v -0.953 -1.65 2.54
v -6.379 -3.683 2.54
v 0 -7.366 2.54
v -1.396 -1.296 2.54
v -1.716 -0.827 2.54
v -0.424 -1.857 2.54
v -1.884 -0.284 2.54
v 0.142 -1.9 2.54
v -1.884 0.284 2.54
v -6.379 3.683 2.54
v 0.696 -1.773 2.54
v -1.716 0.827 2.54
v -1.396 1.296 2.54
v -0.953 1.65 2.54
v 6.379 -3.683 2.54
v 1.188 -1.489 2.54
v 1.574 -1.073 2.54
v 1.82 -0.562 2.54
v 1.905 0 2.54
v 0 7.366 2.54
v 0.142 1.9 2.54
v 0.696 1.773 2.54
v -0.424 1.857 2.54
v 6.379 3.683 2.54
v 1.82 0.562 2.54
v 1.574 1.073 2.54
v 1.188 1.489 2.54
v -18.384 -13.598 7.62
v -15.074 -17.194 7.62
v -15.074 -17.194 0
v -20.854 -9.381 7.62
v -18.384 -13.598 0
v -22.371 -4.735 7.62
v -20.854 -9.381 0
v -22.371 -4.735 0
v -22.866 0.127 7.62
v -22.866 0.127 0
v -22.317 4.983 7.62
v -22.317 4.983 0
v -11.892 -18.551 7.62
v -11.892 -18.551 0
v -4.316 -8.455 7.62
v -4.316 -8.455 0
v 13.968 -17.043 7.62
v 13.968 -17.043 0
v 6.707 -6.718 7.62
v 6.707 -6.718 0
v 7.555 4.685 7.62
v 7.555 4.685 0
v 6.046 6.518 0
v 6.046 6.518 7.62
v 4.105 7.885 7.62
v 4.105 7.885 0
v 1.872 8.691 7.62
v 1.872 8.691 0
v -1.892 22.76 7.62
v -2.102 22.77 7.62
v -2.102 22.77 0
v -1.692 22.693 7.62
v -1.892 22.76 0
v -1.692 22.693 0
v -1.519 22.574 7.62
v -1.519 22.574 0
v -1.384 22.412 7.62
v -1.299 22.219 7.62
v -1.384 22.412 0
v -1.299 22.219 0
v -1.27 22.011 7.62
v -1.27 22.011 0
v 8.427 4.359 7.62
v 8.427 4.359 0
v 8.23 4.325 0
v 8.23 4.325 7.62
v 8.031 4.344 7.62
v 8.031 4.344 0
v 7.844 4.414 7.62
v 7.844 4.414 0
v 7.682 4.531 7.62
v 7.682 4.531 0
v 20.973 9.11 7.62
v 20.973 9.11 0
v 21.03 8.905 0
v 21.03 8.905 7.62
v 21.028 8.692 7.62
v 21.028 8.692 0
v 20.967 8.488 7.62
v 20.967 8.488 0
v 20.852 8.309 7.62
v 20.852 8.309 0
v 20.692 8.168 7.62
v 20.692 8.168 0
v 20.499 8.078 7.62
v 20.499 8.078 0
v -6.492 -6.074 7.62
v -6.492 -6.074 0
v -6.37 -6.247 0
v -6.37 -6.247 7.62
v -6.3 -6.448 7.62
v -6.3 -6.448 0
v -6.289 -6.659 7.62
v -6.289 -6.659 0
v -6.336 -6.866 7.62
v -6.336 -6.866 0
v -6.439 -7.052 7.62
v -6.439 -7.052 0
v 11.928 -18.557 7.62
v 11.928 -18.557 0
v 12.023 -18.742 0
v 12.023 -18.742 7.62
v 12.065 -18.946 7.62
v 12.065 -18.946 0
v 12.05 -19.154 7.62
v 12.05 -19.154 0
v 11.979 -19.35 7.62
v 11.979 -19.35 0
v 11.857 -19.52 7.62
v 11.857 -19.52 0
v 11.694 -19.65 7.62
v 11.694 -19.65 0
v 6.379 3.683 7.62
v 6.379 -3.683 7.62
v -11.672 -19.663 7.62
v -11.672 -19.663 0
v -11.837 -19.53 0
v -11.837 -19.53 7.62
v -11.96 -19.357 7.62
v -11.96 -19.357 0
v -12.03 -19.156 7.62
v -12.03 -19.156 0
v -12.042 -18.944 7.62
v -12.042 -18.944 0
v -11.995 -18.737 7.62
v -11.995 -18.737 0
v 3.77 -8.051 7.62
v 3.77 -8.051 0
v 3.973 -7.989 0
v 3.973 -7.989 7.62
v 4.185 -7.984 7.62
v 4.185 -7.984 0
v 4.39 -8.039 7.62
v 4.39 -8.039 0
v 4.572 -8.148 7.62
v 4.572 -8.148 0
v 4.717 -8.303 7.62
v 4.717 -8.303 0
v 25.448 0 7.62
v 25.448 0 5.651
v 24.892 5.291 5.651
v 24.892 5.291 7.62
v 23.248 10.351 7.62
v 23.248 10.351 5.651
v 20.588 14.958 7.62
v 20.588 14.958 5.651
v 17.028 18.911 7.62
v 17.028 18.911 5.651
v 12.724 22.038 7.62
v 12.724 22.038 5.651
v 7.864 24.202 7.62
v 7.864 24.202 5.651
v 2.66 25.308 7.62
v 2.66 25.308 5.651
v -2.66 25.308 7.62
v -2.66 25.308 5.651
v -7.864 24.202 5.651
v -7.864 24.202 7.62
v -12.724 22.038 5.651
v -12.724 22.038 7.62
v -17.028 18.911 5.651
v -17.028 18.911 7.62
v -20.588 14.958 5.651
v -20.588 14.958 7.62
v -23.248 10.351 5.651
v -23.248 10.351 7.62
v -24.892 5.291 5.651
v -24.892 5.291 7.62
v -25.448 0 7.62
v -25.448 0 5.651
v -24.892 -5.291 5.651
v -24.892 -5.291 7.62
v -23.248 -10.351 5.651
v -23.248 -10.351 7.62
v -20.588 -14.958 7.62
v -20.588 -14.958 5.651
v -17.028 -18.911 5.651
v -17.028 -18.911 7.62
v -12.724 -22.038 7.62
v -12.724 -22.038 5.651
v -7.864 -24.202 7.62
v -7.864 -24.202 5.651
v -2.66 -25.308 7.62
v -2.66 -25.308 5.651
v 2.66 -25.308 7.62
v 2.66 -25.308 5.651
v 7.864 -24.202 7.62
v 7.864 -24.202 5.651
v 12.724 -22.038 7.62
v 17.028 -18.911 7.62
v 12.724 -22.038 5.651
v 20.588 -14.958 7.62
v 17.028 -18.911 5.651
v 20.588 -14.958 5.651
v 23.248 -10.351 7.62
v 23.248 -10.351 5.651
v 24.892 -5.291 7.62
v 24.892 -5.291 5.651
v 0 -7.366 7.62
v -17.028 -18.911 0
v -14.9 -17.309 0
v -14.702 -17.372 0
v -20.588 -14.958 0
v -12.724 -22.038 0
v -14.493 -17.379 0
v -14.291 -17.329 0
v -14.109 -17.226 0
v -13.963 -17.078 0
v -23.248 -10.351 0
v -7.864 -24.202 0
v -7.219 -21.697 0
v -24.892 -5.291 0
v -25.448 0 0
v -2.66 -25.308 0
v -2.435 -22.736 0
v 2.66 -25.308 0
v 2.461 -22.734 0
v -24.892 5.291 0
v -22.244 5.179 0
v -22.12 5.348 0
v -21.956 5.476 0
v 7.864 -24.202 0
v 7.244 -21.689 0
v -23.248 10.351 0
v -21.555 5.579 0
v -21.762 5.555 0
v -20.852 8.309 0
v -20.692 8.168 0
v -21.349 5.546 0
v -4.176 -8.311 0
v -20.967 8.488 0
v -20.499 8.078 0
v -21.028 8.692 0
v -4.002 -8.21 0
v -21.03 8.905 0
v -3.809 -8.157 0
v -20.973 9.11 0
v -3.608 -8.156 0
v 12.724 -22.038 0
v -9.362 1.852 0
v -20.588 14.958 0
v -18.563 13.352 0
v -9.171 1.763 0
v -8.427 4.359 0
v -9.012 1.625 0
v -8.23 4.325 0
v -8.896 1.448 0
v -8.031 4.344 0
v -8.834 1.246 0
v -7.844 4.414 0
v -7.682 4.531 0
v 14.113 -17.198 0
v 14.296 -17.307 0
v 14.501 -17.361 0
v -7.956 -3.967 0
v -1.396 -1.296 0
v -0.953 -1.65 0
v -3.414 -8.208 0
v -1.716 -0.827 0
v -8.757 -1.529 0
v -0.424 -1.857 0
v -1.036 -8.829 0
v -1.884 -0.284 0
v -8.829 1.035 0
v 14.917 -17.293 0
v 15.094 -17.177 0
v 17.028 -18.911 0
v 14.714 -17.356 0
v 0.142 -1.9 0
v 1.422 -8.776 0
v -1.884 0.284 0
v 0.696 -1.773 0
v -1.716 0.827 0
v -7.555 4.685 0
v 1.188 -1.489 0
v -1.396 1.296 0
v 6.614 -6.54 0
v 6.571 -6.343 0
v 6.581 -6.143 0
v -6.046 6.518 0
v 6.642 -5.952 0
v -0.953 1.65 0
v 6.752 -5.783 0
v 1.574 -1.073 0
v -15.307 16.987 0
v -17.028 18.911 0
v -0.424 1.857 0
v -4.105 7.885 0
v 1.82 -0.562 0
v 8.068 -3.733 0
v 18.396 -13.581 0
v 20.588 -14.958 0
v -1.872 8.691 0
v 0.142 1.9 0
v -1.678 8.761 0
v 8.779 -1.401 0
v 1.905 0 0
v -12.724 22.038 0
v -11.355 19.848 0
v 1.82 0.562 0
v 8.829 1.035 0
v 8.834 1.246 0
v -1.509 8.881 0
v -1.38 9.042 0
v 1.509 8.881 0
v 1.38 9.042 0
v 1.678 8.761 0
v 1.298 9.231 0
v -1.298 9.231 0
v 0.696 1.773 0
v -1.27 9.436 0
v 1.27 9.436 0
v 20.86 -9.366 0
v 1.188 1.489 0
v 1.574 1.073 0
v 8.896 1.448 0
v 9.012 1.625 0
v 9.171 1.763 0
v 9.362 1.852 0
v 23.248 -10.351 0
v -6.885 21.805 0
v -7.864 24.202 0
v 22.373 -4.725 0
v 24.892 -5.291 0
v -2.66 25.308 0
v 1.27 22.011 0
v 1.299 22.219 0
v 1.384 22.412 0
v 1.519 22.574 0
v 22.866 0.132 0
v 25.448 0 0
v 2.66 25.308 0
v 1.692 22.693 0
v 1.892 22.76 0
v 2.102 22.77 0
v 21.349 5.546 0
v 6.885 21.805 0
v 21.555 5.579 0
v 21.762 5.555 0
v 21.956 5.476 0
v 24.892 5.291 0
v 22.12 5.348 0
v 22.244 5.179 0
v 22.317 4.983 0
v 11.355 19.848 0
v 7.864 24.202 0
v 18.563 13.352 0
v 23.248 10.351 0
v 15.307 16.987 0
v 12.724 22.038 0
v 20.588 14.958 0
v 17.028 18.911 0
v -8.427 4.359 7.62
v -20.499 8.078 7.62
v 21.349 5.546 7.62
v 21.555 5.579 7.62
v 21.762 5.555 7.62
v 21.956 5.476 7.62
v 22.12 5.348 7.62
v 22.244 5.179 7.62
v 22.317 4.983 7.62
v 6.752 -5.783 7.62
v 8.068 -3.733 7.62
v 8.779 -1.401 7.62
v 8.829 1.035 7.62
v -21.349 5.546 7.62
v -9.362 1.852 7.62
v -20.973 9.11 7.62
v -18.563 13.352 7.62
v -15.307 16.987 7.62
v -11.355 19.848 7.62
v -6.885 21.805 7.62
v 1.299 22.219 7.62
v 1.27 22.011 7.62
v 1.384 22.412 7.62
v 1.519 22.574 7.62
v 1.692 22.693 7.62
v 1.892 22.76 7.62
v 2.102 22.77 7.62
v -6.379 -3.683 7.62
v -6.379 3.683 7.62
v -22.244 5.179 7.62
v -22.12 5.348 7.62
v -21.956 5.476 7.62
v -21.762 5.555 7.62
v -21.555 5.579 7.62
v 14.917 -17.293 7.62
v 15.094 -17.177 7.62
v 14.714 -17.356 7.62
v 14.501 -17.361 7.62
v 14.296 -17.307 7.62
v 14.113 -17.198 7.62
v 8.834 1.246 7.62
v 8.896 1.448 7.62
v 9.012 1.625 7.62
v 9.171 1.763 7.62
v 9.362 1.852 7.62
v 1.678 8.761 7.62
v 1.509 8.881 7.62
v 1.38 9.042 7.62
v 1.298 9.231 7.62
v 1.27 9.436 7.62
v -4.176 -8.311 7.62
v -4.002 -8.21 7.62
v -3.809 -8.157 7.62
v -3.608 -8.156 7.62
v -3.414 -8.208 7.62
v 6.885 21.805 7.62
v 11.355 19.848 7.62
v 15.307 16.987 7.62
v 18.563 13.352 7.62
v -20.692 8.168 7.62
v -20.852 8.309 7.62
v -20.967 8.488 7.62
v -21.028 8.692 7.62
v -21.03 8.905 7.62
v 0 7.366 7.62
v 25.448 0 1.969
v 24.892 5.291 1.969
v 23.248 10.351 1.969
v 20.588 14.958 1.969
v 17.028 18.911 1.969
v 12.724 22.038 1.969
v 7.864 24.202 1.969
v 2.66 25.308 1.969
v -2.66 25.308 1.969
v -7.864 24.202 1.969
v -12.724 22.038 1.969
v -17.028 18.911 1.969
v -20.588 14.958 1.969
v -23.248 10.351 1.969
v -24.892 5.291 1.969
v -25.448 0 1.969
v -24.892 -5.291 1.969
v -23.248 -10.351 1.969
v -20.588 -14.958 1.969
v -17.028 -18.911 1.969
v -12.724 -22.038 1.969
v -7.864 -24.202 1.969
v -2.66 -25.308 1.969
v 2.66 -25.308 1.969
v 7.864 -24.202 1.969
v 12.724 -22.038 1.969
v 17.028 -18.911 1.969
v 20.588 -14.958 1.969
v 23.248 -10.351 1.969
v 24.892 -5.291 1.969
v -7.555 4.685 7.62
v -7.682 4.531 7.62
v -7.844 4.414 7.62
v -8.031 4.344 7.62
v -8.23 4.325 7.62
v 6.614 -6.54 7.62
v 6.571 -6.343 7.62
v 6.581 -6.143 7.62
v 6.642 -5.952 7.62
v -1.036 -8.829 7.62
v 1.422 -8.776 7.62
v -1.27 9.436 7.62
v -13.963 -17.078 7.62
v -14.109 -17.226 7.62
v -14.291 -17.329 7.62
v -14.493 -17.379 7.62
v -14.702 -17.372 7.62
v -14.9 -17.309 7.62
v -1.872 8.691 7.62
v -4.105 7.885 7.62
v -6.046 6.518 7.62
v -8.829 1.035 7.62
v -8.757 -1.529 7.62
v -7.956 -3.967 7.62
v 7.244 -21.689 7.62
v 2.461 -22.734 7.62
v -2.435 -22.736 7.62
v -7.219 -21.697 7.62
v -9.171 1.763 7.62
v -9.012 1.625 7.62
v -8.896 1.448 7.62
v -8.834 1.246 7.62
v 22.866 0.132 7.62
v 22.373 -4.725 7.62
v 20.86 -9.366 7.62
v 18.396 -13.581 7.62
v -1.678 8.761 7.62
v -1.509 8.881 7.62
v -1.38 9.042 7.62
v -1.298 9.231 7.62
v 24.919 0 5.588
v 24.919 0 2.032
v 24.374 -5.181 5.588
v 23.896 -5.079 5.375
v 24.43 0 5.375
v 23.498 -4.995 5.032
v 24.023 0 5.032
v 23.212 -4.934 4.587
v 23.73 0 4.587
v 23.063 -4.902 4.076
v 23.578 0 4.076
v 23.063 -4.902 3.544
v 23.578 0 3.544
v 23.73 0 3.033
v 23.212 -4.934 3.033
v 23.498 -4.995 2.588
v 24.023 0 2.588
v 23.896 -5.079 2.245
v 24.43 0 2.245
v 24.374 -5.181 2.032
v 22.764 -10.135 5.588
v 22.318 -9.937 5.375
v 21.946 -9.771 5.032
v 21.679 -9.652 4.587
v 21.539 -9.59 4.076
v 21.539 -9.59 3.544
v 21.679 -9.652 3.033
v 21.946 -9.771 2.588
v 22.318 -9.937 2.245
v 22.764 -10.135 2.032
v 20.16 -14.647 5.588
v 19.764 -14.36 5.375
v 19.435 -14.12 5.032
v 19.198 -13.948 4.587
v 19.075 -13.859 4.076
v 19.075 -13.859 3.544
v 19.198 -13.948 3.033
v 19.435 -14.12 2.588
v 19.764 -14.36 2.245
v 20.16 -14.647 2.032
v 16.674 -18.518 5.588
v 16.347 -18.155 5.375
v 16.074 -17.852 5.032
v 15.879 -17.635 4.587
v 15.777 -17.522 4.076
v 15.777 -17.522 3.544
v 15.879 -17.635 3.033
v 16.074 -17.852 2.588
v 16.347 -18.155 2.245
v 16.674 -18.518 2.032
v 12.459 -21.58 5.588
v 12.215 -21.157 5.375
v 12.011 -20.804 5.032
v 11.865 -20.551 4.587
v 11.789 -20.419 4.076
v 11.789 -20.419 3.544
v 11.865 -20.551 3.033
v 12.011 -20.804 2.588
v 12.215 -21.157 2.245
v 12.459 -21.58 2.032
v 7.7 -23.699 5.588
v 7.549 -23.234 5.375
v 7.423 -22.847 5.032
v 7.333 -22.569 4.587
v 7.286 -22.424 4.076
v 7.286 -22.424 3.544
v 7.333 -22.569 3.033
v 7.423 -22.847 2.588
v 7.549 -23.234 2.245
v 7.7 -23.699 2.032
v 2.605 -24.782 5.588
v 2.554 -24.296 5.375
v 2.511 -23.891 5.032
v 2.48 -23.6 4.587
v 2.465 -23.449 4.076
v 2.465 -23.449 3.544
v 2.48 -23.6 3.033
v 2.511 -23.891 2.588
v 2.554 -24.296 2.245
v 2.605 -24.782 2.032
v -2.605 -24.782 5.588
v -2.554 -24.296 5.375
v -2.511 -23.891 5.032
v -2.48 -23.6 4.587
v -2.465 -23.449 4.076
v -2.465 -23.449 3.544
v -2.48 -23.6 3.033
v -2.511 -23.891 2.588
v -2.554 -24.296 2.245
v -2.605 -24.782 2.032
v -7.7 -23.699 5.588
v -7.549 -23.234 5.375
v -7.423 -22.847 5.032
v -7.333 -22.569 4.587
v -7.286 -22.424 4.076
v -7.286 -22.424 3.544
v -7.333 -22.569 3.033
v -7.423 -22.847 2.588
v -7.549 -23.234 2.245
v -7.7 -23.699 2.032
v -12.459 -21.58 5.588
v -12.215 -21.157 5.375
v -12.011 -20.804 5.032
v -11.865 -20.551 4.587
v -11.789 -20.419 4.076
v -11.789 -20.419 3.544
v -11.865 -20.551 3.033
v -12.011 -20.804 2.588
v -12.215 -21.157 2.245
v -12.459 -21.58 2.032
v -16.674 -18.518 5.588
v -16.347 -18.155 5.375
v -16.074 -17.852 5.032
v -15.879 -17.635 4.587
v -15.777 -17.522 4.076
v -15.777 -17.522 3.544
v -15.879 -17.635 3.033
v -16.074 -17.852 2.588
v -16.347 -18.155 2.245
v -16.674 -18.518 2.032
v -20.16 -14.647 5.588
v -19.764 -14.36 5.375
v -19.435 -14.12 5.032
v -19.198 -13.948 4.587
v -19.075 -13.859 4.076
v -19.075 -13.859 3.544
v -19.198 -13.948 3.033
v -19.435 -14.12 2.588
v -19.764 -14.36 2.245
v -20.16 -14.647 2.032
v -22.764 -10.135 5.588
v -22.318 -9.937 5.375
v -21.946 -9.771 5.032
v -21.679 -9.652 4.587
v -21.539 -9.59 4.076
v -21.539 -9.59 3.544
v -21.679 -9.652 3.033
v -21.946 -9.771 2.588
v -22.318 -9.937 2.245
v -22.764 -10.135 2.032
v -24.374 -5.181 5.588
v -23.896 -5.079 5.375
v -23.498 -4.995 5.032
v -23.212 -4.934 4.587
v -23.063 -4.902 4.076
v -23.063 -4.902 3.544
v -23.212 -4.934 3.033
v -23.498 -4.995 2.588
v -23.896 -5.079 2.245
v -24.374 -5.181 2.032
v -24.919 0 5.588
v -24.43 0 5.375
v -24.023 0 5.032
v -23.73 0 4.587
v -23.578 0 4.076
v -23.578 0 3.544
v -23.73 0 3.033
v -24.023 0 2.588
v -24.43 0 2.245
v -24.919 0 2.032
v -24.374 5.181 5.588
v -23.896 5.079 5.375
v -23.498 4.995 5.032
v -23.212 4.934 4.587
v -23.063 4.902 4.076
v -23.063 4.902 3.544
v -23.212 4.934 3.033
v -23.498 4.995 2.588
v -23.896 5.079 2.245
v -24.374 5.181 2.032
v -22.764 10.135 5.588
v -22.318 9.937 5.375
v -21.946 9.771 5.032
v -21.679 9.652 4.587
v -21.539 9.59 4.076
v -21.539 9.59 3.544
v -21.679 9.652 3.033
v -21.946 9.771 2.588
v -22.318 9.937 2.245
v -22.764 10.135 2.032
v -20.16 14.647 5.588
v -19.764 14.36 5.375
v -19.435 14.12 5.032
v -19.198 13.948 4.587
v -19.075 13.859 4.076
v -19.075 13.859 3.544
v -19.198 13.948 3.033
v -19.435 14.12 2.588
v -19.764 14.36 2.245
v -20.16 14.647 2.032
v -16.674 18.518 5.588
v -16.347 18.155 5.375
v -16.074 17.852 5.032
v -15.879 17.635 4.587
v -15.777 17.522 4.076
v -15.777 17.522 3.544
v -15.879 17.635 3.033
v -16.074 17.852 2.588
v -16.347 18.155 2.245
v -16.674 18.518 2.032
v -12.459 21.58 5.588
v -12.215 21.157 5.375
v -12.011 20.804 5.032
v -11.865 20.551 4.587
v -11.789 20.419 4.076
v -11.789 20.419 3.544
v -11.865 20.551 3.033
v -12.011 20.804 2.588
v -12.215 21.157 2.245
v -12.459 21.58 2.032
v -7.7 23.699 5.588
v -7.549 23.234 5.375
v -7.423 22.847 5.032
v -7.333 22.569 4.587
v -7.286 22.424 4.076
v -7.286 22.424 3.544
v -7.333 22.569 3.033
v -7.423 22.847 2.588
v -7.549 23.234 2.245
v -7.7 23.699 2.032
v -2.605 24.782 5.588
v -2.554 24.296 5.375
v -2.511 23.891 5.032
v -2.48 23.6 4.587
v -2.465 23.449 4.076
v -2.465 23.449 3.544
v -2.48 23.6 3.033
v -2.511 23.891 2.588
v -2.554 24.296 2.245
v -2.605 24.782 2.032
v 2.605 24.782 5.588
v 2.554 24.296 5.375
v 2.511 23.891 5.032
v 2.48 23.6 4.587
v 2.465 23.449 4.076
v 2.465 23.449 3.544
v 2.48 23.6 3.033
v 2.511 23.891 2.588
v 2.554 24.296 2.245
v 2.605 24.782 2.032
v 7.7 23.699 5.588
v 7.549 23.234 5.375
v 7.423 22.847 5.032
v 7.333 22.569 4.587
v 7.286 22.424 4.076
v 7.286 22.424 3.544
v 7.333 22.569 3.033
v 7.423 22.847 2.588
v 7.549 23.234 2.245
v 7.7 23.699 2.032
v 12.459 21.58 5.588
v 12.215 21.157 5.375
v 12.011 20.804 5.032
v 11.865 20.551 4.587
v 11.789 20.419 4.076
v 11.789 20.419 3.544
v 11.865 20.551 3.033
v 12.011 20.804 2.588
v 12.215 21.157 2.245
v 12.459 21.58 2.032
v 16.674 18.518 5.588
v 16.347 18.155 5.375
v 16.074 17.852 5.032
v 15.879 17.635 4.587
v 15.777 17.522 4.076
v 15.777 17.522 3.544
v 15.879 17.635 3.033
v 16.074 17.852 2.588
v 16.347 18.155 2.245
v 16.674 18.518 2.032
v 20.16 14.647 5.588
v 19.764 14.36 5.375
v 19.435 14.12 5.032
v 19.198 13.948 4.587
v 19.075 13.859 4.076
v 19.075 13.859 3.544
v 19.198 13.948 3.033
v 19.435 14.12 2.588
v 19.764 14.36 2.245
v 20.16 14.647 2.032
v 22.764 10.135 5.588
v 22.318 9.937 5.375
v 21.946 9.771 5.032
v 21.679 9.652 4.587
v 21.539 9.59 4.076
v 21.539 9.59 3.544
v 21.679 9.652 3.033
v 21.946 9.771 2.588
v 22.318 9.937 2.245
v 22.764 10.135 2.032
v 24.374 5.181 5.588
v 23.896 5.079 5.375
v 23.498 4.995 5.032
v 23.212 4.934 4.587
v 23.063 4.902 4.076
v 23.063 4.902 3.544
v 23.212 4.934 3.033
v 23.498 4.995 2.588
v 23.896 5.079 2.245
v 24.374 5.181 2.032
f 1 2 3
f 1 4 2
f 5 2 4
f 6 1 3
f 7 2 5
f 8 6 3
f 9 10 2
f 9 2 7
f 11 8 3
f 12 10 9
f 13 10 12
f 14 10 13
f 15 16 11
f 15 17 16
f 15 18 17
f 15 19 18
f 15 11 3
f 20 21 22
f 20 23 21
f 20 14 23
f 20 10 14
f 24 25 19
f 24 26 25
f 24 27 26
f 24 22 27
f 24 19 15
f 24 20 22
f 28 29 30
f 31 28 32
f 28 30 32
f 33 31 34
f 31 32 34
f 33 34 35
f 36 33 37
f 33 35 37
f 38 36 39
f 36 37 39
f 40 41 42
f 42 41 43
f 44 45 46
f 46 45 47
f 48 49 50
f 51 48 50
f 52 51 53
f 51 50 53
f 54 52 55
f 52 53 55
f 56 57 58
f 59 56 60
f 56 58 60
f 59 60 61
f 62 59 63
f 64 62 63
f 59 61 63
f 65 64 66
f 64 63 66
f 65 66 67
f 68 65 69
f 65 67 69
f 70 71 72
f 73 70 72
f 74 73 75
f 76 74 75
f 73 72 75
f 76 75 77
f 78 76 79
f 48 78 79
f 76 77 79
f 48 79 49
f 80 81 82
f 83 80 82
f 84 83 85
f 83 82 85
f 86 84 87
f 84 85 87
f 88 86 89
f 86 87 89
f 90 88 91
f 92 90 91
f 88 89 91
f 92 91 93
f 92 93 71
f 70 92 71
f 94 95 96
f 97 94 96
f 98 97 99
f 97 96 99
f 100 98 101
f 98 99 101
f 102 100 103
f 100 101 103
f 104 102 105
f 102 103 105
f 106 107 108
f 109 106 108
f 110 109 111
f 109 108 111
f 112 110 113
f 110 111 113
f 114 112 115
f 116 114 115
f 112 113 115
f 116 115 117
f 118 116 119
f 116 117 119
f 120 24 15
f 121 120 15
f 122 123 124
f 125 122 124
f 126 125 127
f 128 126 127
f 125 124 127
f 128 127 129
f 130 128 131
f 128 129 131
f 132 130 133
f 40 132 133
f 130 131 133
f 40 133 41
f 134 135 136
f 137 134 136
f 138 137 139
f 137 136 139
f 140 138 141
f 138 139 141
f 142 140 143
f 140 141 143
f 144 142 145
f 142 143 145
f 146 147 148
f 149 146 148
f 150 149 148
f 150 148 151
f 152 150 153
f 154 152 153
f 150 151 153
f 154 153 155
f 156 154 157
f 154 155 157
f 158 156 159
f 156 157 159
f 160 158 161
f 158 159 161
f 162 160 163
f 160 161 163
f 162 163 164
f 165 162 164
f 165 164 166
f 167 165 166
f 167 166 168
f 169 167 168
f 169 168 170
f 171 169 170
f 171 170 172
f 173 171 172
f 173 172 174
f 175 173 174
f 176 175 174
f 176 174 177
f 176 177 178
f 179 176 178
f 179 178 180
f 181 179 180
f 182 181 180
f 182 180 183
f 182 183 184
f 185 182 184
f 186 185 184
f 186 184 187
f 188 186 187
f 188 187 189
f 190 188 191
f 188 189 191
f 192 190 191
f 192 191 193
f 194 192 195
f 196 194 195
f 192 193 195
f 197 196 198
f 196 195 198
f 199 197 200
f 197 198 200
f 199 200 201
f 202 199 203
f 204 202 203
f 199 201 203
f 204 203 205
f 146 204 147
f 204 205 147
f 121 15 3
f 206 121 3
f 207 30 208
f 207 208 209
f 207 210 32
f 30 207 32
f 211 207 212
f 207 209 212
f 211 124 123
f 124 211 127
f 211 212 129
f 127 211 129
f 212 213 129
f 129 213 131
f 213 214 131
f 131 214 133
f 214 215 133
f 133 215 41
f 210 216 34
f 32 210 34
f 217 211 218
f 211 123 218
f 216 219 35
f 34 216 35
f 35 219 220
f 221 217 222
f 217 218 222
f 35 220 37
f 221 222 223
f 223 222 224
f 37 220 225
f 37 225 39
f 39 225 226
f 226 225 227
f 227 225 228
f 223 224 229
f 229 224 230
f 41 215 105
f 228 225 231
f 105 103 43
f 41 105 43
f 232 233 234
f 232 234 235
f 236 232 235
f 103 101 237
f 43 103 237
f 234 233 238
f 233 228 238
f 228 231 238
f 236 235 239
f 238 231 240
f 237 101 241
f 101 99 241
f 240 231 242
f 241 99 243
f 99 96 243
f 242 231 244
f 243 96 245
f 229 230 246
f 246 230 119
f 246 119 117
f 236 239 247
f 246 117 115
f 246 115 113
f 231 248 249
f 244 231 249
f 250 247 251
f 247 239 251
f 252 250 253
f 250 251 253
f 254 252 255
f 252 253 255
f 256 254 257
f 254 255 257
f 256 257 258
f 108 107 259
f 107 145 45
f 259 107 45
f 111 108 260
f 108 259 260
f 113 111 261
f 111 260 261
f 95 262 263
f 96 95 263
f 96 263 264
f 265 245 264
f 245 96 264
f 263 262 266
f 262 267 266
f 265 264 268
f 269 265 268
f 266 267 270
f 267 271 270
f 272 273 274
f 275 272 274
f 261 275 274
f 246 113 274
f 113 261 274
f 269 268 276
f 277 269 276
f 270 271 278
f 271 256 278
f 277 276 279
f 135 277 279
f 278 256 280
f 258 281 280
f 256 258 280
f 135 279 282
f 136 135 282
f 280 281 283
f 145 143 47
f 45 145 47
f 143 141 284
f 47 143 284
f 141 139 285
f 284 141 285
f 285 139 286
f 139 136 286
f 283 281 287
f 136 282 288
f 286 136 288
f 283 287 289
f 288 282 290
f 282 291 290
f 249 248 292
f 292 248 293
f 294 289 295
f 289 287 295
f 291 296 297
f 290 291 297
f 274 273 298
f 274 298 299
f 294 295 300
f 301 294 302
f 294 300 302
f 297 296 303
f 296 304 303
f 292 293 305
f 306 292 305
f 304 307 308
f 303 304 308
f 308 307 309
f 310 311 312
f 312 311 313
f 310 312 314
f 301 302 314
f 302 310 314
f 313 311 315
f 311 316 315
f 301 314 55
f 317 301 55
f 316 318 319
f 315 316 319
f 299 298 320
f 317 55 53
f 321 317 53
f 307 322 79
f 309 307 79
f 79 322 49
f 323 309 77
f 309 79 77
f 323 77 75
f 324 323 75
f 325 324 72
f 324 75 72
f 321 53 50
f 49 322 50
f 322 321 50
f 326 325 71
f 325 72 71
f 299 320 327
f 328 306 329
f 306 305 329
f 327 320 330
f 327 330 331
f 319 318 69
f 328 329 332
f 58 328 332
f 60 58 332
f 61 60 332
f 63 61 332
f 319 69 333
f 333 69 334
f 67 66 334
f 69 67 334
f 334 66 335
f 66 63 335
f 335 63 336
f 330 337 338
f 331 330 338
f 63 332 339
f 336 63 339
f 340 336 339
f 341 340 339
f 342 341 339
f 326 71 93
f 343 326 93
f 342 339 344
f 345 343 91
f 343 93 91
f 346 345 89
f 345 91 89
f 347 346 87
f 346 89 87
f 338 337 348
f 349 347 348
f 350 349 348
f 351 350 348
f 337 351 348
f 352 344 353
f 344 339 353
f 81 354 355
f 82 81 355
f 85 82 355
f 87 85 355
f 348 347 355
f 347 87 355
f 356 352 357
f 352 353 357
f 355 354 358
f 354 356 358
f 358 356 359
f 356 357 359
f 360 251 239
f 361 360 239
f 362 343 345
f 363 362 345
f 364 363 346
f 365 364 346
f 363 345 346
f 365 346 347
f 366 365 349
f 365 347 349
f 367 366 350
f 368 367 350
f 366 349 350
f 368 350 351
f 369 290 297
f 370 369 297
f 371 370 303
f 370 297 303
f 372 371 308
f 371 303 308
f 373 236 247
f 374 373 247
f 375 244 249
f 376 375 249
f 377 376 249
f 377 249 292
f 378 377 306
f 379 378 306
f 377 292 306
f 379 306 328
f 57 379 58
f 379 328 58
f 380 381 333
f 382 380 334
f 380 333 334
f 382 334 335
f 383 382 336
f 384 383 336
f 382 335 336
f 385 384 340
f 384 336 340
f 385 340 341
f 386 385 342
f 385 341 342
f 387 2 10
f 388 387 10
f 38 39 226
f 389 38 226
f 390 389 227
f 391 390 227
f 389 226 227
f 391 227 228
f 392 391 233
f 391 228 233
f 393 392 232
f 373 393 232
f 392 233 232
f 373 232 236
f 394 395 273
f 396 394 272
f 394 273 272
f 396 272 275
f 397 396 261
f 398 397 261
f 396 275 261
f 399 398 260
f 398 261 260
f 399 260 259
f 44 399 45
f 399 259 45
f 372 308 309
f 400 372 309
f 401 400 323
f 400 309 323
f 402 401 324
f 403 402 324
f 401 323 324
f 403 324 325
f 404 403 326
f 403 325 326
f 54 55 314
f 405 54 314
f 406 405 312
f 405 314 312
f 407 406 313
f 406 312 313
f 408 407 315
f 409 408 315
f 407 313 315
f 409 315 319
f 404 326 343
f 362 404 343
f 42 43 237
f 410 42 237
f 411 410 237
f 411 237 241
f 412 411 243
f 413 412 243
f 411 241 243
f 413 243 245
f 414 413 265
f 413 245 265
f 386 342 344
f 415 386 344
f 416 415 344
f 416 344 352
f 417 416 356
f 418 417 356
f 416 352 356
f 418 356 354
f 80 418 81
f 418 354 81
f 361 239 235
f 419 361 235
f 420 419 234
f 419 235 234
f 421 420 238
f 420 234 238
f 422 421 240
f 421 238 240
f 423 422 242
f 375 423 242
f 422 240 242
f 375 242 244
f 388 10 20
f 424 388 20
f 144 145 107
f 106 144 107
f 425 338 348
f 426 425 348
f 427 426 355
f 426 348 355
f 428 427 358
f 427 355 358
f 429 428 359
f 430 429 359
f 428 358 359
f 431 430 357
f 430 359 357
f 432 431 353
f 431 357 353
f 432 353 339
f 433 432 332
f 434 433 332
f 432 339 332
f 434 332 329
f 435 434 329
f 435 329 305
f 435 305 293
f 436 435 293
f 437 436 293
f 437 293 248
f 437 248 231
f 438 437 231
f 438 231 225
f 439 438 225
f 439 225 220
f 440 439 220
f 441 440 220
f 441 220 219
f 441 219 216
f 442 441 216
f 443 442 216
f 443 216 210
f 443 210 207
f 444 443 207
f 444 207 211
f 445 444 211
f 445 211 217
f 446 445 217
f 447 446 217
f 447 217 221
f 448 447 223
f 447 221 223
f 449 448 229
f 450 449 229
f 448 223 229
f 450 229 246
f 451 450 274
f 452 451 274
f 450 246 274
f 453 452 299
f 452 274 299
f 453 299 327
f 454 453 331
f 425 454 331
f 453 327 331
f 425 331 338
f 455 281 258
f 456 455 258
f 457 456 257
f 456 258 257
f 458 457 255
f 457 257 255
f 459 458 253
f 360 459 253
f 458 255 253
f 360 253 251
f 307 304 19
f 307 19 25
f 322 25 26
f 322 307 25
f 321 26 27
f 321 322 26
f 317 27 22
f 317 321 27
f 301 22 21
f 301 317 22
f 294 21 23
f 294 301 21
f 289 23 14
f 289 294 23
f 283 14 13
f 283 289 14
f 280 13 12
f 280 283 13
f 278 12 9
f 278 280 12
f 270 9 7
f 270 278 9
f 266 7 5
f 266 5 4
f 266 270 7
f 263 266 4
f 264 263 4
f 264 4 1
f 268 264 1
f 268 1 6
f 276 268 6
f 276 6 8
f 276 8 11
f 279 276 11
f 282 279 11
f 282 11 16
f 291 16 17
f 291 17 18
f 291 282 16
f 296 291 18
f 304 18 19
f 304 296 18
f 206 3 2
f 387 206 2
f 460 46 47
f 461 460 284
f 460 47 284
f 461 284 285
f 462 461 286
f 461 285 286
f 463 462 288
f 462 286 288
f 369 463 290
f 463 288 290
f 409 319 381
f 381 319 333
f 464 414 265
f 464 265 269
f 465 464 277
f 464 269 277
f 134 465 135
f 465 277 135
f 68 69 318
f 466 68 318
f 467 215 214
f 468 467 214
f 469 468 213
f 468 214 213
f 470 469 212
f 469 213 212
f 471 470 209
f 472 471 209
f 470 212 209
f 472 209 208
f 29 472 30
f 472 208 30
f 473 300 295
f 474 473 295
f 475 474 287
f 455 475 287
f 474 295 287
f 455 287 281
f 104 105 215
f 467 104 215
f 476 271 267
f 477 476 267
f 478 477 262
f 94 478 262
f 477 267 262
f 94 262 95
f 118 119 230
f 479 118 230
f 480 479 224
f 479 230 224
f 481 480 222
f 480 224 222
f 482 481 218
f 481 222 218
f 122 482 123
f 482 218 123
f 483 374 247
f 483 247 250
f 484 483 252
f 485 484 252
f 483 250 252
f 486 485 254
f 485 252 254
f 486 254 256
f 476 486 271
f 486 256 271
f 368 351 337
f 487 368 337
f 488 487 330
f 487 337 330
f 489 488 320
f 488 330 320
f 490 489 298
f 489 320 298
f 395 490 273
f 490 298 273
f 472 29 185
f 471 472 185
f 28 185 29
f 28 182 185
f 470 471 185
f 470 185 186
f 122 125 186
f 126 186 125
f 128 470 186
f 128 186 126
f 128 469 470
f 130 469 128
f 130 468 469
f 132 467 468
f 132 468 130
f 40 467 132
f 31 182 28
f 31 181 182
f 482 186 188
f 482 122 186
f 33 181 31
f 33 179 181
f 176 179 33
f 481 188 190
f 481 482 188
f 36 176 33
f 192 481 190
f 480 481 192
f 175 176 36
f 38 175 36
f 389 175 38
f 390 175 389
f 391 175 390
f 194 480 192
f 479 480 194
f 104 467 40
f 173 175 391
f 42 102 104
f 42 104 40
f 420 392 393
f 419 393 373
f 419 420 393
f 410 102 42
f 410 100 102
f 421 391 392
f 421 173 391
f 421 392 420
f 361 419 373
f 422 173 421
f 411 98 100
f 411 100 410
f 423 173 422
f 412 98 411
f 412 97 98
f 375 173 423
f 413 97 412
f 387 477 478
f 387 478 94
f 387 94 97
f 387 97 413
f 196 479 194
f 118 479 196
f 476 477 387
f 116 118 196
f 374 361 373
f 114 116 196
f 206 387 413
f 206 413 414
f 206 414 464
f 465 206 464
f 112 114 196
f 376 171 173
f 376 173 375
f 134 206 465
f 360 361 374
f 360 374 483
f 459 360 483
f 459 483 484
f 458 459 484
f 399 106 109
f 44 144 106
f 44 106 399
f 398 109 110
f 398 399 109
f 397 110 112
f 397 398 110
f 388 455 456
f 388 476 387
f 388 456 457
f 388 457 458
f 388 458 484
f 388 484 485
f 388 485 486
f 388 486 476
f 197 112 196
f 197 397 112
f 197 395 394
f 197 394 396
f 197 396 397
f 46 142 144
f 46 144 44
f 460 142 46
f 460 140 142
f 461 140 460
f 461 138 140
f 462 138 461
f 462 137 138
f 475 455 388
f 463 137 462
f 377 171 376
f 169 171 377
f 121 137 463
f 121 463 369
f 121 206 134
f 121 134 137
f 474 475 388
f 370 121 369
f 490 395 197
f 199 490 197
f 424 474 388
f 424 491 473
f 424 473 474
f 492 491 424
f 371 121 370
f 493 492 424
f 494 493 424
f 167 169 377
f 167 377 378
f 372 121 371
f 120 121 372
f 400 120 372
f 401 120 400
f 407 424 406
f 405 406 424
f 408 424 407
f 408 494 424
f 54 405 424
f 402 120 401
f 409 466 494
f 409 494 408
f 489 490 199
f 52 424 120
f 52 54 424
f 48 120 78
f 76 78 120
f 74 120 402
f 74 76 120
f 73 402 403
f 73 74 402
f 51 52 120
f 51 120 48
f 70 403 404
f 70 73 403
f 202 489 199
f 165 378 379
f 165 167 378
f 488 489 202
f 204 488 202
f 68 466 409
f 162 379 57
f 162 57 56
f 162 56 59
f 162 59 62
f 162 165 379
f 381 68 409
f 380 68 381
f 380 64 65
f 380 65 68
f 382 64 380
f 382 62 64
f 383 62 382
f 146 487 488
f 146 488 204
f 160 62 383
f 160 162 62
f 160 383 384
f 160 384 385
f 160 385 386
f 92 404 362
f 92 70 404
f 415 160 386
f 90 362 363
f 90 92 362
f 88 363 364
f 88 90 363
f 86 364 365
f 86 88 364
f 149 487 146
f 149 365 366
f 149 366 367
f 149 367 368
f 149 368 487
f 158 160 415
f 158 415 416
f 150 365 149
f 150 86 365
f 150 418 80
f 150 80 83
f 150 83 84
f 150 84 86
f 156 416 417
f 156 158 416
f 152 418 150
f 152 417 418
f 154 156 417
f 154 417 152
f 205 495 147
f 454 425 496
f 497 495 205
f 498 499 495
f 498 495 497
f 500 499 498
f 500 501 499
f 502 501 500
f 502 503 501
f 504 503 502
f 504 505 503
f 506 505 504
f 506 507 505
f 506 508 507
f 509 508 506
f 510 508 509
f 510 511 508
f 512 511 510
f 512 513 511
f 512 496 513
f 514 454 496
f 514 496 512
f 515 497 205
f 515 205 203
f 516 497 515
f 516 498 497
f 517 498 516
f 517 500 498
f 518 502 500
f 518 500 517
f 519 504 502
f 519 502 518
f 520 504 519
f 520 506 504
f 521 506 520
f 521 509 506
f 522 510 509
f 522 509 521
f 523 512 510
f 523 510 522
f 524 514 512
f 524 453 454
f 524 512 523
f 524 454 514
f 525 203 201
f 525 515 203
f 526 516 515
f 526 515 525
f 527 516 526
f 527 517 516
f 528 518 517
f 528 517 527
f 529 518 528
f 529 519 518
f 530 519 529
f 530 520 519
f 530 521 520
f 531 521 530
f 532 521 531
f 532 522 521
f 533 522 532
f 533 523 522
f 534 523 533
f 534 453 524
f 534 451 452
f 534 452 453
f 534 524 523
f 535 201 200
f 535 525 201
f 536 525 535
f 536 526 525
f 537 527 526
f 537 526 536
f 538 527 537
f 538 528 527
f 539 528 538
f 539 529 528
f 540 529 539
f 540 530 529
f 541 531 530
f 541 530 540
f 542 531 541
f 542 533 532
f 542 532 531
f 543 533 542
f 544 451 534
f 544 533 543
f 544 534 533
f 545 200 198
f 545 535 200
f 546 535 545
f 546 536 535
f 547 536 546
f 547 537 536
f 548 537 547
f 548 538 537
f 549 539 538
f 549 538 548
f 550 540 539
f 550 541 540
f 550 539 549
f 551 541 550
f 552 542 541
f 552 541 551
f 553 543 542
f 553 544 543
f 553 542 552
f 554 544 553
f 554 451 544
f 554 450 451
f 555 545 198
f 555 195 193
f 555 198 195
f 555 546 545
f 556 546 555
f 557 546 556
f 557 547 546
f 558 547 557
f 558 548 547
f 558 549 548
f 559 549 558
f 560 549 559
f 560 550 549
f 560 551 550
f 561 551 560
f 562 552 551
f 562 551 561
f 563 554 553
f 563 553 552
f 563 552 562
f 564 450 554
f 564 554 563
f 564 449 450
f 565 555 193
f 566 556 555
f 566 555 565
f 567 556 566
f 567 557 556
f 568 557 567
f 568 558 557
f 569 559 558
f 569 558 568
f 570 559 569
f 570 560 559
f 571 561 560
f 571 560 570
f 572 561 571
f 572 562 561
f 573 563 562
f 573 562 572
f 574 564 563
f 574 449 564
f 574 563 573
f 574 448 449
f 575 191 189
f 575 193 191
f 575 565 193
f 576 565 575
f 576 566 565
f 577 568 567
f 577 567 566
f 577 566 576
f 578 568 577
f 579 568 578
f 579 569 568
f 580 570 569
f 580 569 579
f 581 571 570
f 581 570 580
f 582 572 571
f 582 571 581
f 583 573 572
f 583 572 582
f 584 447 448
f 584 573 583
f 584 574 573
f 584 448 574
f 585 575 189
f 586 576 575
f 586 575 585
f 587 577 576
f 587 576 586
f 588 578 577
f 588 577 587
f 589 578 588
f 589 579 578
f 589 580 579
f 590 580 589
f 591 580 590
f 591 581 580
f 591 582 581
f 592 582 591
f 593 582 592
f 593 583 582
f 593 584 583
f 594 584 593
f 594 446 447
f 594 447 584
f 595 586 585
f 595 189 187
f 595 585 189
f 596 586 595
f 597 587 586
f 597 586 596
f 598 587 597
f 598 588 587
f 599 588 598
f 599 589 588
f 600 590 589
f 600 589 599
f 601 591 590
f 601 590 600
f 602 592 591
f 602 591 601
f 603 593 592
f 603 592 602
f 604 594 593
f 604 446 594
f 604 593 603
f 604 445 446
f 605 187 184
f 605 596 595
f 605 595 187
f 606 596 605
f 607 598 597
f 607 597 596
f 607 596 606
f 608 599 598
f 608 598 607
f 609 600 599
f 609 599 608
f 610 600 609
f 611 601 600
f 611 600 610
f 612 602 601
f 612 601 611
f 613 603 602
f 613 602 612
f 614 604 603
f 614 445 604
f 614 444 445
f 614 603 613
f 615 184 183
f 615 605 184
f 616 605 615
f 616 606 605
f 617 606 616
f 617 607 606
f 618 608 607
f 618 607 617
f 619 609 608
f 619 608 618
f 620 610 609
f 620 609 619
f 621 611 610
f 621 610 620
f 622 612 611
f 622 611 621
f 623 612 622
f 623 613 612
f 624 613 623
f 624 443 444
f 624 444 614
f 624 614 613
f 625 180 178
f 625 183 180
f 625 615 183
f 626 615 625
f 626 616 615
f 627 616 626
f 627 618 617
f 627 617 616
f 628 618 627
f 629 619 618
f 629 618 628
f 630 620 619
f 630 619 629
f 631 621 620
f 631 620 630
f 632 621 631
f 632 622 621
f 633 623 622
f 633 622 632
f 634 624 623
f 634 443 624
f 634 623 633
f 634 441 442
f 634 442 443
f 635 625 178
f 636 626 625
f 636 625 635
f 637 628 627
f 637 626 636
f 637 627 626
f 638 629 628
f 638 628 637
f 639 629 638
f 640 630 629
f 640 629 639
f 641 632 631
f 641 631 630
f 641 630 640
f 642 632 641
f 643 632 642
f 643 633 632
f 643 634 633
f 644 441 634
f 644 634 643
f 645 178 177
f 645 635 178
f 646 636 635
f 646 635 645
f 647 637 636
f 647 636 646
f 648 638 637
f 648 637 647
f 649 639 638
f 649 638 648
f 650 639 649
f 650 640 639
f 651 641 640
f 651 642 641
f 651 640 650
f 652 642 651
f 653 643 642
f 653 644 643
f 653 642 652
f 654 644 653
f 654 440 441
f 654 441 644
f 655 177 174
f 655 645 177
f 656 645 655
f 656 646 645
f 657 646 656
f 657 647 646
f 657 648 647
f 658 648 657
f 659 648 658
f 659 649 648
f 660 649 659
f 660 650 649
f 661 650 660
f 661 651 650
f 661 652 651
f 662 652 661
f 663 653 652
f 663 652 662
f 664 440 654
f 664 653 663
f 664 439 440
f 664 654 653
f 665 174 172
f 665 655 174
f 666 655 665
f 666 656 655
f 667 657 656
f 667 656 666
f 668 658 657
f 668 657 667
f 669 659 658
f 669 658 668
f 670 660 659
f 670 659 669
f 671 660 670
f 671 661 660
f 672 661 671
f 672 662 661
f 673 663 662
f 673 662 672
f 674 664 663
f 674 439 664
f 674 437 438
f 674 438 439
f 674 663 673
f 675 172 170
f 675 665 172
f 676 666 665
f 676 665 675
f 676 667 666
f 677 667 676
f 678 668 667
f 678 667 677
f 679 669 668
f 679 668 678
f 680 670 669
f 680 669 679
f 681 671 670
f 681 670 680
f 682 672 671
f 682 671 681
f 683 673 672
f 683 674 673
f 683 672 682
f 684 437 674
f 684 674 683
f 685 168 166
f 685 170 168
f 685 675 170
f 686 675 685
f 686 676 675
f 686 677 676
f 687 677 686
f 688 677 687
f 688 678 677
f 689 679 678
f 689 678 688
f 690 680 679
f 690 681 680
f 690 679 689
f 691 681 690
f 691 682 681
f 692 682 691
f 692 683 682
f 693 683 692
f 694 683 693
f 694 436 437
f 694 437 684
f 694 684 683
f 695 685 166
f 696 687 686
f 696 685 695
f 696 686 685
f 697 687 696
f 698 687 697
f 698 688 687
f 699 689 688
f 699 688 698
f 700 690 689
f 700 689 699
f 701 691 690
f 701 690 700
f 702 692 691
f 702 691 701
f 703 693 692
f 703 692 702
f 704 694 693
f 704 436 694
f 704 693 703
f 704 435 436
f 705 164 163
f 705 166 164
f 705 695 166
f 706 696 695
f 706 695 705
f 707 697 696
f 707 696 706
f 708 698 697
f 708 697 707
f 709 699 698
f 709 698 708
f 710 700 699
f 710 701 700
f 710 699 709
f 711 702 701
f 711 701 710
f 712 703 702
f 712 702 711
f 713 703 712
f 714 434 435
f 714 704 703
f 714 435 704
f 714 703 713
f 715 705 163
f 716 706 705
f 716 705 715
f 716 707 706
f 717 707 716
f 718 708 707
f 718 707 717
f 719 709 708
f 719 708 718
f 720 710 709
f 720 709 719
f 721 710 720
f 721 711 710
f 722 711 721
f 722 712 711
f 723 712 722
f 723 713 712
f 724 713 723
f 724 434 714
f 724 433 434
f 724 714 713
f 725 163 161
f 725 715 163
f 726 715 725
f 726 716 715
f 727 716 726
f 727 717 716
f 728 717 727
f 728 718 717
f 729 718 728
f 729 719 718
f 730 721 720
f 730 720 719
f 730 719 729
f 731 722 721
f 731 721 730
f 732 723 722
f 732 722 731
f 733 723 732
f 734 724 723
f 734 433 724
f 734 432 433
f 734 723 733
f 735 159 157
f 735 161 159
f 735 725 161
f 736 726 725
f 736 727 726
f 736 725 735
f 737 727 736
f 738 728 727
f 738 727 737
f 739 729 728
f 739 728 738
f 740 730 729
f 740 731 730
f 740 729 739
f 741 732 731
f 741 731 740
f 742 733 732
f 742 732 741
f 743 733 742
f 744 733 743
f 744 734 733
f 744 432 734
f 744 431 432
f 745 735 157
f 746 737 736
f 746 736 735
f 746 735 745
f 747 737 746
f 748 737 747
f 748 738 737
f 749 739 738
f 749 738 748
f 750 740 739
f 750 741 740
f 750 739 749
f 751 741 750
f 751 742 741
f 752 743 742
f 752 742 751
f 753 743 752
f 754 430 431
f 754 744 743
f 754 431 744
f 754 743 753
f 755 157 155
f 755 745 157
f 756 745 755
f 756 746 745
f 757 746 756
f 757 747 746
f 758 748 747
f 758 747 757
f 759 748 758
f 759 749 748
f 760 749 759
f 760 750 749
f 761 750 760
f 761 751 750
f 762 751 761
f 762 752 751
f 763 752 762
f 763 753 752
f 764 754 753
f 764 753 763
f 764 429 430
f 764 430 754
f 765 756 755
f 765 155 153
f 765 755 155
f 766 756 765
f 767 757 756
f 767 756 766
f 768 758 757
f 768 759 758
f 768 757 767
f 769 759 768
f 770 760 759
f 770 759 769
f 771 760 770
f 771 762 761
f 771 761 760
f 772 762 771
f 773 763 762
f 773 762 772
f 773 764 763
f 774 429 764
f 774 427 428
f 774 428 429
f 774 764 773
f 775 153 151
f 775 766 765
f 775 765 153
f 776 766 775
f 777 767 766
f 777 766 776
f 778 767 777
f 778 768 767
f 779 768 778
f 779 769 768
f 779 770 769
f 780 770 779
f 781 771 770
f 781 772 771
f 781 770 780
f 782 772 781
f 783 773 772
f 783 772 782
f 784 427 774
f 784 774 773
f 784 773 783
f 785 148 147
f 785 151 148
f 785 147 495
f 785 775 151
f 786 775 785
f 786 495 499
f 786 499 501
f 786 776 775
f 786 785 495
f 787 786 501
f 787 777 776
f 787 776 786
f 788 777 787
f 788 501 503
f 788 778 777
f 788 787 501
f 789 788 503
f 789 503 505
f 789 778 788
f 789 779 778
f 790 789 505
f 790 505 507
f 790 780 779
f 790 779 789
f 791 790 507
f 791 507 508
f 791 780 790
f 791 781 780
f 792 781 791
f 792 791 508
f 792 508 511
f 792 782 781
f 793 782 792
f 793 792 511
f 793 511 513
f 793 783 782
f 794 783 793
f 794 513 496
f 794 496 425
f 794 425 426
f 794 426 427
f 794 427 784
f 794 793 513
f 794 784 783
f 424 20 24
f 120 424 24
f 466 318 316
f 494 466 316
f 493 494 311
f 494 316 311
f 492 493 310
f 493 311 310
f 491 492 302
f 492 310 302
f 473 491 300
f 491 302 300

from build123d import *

# Parameters (mm, degrees)
F0_R     = 25.447764
F1_DEPTH = 7.62
F0_R_2   = 1.905
F2_DEPTH = 2.54
F4_R     = 1.8415


with BuildPart() as f1:
    # F0 (on Top) → F1 (new body)
    with BuildSketch(Plane.XY):
        Circle(F0_R)
        with BuildLine():
            ThreePointArc((-15.074386, -17.193977), (-21.736663, -7.098412), (-22.316716, 4.983389))
            ThreePointArc((-22.316716, 4.983389), (-21.955689, 5.476274), (-21.348665, 5.545541))
            Line((-21.348665, 5.545541), (-9.361943, 1.852396))
            ThreePointArc((-9.361943, 1.852396), (-8.947922, 1.540235), (-8.829496, 1.035425))
            ThreePointArc((-8.829496, 1.035425), (-8.445105, -2.777104), (-6.491723, -6.073684))
            ThreePointArc((-6.491723, -6.073684), (-6.287275, -6.553007), (-6.438668, -7.051635))
            Line((-6.438668, -7.051635), (-13.962558, -17.078354))
            ThreePointArc((-13.962558, -17.078354), (-14.493227, -17.378917), (-15.074386, -17.193977))
        make_face(mode=Mode.SUBTRACT)
        with BuildLine():
            Line((-11.892139, -18.55065), (-4.316171, -8.45453))
            ThreePointArc((-4.316171, -8.45453), (-3.90732, -8.176769), (-3.41405, -8.208311))
            ThreePointArc((-3.41405, -8.208311), (0.194774, -8.887866), (3.770364, -8.050867))
            ThreePointArc((3.770364, -8.050867), (4.289406, -8.004544), (4.716846, -8.302613))
            Line((4.716846, -8.302613), (11.927812, -18.556683))
            ThreePointArc((11.927812, -18.556683), (12.049678, -19.154259), (11.694203, -19.649824))
            ThreePointArc((11.694203, -19.649824), (0.013149, -22.866346), (-11.671596, -19.66326))
            ThreePointArc((-11.671596, -19.66326), (-12.030108, -19.156162), (-11.892139, -18.55065))
        make_face(mode=Mode.SUBTRACT)
        with BuildLine():
            Line((13.967844, -17.042562), (6.706966, -6.717516))
            ThreePointArc((6.706966, -6.717516), (6.569141, -6.242843), (6.751568, -5.783462))
            ThreePointArc((6.751568, -5.783462), (8.503922, -2.591411), (8.829496, 1.035425))
            ThreePointArc((8.829496, 1.035425), (8.947922, 1.540235), (9.361943, 1.852395))
            Line((9.361943, 1.852395), (21.348665, 5.545541))
            ThreePointArc((21.348665, 5.545541), (21.955689, 5.476274), (22.316716, 4.983389))
            ThreePointArc((22.316716, 4.983389), (21.740741, -7.085911), (15.09415, -17.176629))
            ThreePointArc((15.09415, -17.176629), (14.501085, -17.360892), (13.967844, -17.042562))
        make_face(mode=Mode.SUBTRACT)
        with BuildLine():
            ThreePointArc((-1.27, 9.435681), (-1.439174, 8.956931), (-1.871579, 8.690759))
            ThreePointArc((-1.871579, 8.690759), (-5.121211, 7.266725), (-7.555153, 4.68527))
            ThreePointArc((-7.555153, 4.68527), (-7.935438, 4.373286), (-8.427105, 4.358645))
            Line((-8.427105, 4.358645), (-20.498814, 8.077976))
            ThreePointArc((-20.498814, 8.077976), (-20.966736, 8.487792), (-20.973365, 9.10977))
            ThreePointArc((-20.973365, 9.10977), (-13.407682, 18.523068), (-2.102049, 22.769527))
            ThreePointArc((-2.102049, 22.769527), (-1.518548, 22.57379), (-1.27, 22.010753))
            Line((-1.27, 22.010753), (-1.27, 9.435681))
        make_face(mode=Mode.SUBTRACT)
        Polygon((6.379143, -3.683), (0, -7.366), (-6.379143, -3.683), (-6.379143, 3.683), (0, 7.366), (6.379143, 3.683), align=None, mode=Mode.SUBTRACT)
        with BuildLine():
            Line((1.27, 9.435681), (1.27, 22.010753))
            ThreePointArc((1.27, 22.010753), (1.518548, 22.57379), (2.102049, 22.769527))
            ThreePointArc((2.102049, 22.769527), (13.407682, 18.523068), (20.973365, 9.10977))
            ThreePointArc((20.973365, 9.10977), (20.966736, 8.487792), (20.498814, 8.077976))
            Line((20.498814, 8.077976), (8.427105, 4.358645))
            ThreePointArc((8.427105, 4.358645), (7.935438, 4.373285), (7.555154, 4.68527))
            ThreePointArc((7.555154, 4.68527), (5.121212, 7.266725), (1.871579, 8.690759))
            ThreePointArc((1.871579, 8.690759), (1.439174, 8.956931), (1.27, 9.435681))
        make_face(mode=Mode.SUBTRACT)
    extrude(amount=F1_DEPTH)

    # F0 (on Top) → F2 (join)
    with BuildSketch(Plane.XY):
        Polygon((-6.379143, -3.683), (0, -7.366), (6.379143, -3.683), (6.379143, 3.683), (0, 7.366), (-6.379143, 3.683), align=None)
        Circle(F0_R_2, mode=Mode.SUBTRACT)
    extrude(amount=F2_DEPTH)


with BuildPart() as f5:
    # F4 (on Front) → F5 (revolve)
    with BuildSketch(Plane.XZ):
        with Locations((25.4, 3.81)):
            Circle(F4_R)
    revolve(axis=Axis((0, 0, -1.325227), (0, 0, -1)))


with BuildPart() as f1_1:
    add(f1.part)

    # F6: cut F5
    add(f5.part, mode=Mode.SUBTRACT)


solid = f1_1.part
